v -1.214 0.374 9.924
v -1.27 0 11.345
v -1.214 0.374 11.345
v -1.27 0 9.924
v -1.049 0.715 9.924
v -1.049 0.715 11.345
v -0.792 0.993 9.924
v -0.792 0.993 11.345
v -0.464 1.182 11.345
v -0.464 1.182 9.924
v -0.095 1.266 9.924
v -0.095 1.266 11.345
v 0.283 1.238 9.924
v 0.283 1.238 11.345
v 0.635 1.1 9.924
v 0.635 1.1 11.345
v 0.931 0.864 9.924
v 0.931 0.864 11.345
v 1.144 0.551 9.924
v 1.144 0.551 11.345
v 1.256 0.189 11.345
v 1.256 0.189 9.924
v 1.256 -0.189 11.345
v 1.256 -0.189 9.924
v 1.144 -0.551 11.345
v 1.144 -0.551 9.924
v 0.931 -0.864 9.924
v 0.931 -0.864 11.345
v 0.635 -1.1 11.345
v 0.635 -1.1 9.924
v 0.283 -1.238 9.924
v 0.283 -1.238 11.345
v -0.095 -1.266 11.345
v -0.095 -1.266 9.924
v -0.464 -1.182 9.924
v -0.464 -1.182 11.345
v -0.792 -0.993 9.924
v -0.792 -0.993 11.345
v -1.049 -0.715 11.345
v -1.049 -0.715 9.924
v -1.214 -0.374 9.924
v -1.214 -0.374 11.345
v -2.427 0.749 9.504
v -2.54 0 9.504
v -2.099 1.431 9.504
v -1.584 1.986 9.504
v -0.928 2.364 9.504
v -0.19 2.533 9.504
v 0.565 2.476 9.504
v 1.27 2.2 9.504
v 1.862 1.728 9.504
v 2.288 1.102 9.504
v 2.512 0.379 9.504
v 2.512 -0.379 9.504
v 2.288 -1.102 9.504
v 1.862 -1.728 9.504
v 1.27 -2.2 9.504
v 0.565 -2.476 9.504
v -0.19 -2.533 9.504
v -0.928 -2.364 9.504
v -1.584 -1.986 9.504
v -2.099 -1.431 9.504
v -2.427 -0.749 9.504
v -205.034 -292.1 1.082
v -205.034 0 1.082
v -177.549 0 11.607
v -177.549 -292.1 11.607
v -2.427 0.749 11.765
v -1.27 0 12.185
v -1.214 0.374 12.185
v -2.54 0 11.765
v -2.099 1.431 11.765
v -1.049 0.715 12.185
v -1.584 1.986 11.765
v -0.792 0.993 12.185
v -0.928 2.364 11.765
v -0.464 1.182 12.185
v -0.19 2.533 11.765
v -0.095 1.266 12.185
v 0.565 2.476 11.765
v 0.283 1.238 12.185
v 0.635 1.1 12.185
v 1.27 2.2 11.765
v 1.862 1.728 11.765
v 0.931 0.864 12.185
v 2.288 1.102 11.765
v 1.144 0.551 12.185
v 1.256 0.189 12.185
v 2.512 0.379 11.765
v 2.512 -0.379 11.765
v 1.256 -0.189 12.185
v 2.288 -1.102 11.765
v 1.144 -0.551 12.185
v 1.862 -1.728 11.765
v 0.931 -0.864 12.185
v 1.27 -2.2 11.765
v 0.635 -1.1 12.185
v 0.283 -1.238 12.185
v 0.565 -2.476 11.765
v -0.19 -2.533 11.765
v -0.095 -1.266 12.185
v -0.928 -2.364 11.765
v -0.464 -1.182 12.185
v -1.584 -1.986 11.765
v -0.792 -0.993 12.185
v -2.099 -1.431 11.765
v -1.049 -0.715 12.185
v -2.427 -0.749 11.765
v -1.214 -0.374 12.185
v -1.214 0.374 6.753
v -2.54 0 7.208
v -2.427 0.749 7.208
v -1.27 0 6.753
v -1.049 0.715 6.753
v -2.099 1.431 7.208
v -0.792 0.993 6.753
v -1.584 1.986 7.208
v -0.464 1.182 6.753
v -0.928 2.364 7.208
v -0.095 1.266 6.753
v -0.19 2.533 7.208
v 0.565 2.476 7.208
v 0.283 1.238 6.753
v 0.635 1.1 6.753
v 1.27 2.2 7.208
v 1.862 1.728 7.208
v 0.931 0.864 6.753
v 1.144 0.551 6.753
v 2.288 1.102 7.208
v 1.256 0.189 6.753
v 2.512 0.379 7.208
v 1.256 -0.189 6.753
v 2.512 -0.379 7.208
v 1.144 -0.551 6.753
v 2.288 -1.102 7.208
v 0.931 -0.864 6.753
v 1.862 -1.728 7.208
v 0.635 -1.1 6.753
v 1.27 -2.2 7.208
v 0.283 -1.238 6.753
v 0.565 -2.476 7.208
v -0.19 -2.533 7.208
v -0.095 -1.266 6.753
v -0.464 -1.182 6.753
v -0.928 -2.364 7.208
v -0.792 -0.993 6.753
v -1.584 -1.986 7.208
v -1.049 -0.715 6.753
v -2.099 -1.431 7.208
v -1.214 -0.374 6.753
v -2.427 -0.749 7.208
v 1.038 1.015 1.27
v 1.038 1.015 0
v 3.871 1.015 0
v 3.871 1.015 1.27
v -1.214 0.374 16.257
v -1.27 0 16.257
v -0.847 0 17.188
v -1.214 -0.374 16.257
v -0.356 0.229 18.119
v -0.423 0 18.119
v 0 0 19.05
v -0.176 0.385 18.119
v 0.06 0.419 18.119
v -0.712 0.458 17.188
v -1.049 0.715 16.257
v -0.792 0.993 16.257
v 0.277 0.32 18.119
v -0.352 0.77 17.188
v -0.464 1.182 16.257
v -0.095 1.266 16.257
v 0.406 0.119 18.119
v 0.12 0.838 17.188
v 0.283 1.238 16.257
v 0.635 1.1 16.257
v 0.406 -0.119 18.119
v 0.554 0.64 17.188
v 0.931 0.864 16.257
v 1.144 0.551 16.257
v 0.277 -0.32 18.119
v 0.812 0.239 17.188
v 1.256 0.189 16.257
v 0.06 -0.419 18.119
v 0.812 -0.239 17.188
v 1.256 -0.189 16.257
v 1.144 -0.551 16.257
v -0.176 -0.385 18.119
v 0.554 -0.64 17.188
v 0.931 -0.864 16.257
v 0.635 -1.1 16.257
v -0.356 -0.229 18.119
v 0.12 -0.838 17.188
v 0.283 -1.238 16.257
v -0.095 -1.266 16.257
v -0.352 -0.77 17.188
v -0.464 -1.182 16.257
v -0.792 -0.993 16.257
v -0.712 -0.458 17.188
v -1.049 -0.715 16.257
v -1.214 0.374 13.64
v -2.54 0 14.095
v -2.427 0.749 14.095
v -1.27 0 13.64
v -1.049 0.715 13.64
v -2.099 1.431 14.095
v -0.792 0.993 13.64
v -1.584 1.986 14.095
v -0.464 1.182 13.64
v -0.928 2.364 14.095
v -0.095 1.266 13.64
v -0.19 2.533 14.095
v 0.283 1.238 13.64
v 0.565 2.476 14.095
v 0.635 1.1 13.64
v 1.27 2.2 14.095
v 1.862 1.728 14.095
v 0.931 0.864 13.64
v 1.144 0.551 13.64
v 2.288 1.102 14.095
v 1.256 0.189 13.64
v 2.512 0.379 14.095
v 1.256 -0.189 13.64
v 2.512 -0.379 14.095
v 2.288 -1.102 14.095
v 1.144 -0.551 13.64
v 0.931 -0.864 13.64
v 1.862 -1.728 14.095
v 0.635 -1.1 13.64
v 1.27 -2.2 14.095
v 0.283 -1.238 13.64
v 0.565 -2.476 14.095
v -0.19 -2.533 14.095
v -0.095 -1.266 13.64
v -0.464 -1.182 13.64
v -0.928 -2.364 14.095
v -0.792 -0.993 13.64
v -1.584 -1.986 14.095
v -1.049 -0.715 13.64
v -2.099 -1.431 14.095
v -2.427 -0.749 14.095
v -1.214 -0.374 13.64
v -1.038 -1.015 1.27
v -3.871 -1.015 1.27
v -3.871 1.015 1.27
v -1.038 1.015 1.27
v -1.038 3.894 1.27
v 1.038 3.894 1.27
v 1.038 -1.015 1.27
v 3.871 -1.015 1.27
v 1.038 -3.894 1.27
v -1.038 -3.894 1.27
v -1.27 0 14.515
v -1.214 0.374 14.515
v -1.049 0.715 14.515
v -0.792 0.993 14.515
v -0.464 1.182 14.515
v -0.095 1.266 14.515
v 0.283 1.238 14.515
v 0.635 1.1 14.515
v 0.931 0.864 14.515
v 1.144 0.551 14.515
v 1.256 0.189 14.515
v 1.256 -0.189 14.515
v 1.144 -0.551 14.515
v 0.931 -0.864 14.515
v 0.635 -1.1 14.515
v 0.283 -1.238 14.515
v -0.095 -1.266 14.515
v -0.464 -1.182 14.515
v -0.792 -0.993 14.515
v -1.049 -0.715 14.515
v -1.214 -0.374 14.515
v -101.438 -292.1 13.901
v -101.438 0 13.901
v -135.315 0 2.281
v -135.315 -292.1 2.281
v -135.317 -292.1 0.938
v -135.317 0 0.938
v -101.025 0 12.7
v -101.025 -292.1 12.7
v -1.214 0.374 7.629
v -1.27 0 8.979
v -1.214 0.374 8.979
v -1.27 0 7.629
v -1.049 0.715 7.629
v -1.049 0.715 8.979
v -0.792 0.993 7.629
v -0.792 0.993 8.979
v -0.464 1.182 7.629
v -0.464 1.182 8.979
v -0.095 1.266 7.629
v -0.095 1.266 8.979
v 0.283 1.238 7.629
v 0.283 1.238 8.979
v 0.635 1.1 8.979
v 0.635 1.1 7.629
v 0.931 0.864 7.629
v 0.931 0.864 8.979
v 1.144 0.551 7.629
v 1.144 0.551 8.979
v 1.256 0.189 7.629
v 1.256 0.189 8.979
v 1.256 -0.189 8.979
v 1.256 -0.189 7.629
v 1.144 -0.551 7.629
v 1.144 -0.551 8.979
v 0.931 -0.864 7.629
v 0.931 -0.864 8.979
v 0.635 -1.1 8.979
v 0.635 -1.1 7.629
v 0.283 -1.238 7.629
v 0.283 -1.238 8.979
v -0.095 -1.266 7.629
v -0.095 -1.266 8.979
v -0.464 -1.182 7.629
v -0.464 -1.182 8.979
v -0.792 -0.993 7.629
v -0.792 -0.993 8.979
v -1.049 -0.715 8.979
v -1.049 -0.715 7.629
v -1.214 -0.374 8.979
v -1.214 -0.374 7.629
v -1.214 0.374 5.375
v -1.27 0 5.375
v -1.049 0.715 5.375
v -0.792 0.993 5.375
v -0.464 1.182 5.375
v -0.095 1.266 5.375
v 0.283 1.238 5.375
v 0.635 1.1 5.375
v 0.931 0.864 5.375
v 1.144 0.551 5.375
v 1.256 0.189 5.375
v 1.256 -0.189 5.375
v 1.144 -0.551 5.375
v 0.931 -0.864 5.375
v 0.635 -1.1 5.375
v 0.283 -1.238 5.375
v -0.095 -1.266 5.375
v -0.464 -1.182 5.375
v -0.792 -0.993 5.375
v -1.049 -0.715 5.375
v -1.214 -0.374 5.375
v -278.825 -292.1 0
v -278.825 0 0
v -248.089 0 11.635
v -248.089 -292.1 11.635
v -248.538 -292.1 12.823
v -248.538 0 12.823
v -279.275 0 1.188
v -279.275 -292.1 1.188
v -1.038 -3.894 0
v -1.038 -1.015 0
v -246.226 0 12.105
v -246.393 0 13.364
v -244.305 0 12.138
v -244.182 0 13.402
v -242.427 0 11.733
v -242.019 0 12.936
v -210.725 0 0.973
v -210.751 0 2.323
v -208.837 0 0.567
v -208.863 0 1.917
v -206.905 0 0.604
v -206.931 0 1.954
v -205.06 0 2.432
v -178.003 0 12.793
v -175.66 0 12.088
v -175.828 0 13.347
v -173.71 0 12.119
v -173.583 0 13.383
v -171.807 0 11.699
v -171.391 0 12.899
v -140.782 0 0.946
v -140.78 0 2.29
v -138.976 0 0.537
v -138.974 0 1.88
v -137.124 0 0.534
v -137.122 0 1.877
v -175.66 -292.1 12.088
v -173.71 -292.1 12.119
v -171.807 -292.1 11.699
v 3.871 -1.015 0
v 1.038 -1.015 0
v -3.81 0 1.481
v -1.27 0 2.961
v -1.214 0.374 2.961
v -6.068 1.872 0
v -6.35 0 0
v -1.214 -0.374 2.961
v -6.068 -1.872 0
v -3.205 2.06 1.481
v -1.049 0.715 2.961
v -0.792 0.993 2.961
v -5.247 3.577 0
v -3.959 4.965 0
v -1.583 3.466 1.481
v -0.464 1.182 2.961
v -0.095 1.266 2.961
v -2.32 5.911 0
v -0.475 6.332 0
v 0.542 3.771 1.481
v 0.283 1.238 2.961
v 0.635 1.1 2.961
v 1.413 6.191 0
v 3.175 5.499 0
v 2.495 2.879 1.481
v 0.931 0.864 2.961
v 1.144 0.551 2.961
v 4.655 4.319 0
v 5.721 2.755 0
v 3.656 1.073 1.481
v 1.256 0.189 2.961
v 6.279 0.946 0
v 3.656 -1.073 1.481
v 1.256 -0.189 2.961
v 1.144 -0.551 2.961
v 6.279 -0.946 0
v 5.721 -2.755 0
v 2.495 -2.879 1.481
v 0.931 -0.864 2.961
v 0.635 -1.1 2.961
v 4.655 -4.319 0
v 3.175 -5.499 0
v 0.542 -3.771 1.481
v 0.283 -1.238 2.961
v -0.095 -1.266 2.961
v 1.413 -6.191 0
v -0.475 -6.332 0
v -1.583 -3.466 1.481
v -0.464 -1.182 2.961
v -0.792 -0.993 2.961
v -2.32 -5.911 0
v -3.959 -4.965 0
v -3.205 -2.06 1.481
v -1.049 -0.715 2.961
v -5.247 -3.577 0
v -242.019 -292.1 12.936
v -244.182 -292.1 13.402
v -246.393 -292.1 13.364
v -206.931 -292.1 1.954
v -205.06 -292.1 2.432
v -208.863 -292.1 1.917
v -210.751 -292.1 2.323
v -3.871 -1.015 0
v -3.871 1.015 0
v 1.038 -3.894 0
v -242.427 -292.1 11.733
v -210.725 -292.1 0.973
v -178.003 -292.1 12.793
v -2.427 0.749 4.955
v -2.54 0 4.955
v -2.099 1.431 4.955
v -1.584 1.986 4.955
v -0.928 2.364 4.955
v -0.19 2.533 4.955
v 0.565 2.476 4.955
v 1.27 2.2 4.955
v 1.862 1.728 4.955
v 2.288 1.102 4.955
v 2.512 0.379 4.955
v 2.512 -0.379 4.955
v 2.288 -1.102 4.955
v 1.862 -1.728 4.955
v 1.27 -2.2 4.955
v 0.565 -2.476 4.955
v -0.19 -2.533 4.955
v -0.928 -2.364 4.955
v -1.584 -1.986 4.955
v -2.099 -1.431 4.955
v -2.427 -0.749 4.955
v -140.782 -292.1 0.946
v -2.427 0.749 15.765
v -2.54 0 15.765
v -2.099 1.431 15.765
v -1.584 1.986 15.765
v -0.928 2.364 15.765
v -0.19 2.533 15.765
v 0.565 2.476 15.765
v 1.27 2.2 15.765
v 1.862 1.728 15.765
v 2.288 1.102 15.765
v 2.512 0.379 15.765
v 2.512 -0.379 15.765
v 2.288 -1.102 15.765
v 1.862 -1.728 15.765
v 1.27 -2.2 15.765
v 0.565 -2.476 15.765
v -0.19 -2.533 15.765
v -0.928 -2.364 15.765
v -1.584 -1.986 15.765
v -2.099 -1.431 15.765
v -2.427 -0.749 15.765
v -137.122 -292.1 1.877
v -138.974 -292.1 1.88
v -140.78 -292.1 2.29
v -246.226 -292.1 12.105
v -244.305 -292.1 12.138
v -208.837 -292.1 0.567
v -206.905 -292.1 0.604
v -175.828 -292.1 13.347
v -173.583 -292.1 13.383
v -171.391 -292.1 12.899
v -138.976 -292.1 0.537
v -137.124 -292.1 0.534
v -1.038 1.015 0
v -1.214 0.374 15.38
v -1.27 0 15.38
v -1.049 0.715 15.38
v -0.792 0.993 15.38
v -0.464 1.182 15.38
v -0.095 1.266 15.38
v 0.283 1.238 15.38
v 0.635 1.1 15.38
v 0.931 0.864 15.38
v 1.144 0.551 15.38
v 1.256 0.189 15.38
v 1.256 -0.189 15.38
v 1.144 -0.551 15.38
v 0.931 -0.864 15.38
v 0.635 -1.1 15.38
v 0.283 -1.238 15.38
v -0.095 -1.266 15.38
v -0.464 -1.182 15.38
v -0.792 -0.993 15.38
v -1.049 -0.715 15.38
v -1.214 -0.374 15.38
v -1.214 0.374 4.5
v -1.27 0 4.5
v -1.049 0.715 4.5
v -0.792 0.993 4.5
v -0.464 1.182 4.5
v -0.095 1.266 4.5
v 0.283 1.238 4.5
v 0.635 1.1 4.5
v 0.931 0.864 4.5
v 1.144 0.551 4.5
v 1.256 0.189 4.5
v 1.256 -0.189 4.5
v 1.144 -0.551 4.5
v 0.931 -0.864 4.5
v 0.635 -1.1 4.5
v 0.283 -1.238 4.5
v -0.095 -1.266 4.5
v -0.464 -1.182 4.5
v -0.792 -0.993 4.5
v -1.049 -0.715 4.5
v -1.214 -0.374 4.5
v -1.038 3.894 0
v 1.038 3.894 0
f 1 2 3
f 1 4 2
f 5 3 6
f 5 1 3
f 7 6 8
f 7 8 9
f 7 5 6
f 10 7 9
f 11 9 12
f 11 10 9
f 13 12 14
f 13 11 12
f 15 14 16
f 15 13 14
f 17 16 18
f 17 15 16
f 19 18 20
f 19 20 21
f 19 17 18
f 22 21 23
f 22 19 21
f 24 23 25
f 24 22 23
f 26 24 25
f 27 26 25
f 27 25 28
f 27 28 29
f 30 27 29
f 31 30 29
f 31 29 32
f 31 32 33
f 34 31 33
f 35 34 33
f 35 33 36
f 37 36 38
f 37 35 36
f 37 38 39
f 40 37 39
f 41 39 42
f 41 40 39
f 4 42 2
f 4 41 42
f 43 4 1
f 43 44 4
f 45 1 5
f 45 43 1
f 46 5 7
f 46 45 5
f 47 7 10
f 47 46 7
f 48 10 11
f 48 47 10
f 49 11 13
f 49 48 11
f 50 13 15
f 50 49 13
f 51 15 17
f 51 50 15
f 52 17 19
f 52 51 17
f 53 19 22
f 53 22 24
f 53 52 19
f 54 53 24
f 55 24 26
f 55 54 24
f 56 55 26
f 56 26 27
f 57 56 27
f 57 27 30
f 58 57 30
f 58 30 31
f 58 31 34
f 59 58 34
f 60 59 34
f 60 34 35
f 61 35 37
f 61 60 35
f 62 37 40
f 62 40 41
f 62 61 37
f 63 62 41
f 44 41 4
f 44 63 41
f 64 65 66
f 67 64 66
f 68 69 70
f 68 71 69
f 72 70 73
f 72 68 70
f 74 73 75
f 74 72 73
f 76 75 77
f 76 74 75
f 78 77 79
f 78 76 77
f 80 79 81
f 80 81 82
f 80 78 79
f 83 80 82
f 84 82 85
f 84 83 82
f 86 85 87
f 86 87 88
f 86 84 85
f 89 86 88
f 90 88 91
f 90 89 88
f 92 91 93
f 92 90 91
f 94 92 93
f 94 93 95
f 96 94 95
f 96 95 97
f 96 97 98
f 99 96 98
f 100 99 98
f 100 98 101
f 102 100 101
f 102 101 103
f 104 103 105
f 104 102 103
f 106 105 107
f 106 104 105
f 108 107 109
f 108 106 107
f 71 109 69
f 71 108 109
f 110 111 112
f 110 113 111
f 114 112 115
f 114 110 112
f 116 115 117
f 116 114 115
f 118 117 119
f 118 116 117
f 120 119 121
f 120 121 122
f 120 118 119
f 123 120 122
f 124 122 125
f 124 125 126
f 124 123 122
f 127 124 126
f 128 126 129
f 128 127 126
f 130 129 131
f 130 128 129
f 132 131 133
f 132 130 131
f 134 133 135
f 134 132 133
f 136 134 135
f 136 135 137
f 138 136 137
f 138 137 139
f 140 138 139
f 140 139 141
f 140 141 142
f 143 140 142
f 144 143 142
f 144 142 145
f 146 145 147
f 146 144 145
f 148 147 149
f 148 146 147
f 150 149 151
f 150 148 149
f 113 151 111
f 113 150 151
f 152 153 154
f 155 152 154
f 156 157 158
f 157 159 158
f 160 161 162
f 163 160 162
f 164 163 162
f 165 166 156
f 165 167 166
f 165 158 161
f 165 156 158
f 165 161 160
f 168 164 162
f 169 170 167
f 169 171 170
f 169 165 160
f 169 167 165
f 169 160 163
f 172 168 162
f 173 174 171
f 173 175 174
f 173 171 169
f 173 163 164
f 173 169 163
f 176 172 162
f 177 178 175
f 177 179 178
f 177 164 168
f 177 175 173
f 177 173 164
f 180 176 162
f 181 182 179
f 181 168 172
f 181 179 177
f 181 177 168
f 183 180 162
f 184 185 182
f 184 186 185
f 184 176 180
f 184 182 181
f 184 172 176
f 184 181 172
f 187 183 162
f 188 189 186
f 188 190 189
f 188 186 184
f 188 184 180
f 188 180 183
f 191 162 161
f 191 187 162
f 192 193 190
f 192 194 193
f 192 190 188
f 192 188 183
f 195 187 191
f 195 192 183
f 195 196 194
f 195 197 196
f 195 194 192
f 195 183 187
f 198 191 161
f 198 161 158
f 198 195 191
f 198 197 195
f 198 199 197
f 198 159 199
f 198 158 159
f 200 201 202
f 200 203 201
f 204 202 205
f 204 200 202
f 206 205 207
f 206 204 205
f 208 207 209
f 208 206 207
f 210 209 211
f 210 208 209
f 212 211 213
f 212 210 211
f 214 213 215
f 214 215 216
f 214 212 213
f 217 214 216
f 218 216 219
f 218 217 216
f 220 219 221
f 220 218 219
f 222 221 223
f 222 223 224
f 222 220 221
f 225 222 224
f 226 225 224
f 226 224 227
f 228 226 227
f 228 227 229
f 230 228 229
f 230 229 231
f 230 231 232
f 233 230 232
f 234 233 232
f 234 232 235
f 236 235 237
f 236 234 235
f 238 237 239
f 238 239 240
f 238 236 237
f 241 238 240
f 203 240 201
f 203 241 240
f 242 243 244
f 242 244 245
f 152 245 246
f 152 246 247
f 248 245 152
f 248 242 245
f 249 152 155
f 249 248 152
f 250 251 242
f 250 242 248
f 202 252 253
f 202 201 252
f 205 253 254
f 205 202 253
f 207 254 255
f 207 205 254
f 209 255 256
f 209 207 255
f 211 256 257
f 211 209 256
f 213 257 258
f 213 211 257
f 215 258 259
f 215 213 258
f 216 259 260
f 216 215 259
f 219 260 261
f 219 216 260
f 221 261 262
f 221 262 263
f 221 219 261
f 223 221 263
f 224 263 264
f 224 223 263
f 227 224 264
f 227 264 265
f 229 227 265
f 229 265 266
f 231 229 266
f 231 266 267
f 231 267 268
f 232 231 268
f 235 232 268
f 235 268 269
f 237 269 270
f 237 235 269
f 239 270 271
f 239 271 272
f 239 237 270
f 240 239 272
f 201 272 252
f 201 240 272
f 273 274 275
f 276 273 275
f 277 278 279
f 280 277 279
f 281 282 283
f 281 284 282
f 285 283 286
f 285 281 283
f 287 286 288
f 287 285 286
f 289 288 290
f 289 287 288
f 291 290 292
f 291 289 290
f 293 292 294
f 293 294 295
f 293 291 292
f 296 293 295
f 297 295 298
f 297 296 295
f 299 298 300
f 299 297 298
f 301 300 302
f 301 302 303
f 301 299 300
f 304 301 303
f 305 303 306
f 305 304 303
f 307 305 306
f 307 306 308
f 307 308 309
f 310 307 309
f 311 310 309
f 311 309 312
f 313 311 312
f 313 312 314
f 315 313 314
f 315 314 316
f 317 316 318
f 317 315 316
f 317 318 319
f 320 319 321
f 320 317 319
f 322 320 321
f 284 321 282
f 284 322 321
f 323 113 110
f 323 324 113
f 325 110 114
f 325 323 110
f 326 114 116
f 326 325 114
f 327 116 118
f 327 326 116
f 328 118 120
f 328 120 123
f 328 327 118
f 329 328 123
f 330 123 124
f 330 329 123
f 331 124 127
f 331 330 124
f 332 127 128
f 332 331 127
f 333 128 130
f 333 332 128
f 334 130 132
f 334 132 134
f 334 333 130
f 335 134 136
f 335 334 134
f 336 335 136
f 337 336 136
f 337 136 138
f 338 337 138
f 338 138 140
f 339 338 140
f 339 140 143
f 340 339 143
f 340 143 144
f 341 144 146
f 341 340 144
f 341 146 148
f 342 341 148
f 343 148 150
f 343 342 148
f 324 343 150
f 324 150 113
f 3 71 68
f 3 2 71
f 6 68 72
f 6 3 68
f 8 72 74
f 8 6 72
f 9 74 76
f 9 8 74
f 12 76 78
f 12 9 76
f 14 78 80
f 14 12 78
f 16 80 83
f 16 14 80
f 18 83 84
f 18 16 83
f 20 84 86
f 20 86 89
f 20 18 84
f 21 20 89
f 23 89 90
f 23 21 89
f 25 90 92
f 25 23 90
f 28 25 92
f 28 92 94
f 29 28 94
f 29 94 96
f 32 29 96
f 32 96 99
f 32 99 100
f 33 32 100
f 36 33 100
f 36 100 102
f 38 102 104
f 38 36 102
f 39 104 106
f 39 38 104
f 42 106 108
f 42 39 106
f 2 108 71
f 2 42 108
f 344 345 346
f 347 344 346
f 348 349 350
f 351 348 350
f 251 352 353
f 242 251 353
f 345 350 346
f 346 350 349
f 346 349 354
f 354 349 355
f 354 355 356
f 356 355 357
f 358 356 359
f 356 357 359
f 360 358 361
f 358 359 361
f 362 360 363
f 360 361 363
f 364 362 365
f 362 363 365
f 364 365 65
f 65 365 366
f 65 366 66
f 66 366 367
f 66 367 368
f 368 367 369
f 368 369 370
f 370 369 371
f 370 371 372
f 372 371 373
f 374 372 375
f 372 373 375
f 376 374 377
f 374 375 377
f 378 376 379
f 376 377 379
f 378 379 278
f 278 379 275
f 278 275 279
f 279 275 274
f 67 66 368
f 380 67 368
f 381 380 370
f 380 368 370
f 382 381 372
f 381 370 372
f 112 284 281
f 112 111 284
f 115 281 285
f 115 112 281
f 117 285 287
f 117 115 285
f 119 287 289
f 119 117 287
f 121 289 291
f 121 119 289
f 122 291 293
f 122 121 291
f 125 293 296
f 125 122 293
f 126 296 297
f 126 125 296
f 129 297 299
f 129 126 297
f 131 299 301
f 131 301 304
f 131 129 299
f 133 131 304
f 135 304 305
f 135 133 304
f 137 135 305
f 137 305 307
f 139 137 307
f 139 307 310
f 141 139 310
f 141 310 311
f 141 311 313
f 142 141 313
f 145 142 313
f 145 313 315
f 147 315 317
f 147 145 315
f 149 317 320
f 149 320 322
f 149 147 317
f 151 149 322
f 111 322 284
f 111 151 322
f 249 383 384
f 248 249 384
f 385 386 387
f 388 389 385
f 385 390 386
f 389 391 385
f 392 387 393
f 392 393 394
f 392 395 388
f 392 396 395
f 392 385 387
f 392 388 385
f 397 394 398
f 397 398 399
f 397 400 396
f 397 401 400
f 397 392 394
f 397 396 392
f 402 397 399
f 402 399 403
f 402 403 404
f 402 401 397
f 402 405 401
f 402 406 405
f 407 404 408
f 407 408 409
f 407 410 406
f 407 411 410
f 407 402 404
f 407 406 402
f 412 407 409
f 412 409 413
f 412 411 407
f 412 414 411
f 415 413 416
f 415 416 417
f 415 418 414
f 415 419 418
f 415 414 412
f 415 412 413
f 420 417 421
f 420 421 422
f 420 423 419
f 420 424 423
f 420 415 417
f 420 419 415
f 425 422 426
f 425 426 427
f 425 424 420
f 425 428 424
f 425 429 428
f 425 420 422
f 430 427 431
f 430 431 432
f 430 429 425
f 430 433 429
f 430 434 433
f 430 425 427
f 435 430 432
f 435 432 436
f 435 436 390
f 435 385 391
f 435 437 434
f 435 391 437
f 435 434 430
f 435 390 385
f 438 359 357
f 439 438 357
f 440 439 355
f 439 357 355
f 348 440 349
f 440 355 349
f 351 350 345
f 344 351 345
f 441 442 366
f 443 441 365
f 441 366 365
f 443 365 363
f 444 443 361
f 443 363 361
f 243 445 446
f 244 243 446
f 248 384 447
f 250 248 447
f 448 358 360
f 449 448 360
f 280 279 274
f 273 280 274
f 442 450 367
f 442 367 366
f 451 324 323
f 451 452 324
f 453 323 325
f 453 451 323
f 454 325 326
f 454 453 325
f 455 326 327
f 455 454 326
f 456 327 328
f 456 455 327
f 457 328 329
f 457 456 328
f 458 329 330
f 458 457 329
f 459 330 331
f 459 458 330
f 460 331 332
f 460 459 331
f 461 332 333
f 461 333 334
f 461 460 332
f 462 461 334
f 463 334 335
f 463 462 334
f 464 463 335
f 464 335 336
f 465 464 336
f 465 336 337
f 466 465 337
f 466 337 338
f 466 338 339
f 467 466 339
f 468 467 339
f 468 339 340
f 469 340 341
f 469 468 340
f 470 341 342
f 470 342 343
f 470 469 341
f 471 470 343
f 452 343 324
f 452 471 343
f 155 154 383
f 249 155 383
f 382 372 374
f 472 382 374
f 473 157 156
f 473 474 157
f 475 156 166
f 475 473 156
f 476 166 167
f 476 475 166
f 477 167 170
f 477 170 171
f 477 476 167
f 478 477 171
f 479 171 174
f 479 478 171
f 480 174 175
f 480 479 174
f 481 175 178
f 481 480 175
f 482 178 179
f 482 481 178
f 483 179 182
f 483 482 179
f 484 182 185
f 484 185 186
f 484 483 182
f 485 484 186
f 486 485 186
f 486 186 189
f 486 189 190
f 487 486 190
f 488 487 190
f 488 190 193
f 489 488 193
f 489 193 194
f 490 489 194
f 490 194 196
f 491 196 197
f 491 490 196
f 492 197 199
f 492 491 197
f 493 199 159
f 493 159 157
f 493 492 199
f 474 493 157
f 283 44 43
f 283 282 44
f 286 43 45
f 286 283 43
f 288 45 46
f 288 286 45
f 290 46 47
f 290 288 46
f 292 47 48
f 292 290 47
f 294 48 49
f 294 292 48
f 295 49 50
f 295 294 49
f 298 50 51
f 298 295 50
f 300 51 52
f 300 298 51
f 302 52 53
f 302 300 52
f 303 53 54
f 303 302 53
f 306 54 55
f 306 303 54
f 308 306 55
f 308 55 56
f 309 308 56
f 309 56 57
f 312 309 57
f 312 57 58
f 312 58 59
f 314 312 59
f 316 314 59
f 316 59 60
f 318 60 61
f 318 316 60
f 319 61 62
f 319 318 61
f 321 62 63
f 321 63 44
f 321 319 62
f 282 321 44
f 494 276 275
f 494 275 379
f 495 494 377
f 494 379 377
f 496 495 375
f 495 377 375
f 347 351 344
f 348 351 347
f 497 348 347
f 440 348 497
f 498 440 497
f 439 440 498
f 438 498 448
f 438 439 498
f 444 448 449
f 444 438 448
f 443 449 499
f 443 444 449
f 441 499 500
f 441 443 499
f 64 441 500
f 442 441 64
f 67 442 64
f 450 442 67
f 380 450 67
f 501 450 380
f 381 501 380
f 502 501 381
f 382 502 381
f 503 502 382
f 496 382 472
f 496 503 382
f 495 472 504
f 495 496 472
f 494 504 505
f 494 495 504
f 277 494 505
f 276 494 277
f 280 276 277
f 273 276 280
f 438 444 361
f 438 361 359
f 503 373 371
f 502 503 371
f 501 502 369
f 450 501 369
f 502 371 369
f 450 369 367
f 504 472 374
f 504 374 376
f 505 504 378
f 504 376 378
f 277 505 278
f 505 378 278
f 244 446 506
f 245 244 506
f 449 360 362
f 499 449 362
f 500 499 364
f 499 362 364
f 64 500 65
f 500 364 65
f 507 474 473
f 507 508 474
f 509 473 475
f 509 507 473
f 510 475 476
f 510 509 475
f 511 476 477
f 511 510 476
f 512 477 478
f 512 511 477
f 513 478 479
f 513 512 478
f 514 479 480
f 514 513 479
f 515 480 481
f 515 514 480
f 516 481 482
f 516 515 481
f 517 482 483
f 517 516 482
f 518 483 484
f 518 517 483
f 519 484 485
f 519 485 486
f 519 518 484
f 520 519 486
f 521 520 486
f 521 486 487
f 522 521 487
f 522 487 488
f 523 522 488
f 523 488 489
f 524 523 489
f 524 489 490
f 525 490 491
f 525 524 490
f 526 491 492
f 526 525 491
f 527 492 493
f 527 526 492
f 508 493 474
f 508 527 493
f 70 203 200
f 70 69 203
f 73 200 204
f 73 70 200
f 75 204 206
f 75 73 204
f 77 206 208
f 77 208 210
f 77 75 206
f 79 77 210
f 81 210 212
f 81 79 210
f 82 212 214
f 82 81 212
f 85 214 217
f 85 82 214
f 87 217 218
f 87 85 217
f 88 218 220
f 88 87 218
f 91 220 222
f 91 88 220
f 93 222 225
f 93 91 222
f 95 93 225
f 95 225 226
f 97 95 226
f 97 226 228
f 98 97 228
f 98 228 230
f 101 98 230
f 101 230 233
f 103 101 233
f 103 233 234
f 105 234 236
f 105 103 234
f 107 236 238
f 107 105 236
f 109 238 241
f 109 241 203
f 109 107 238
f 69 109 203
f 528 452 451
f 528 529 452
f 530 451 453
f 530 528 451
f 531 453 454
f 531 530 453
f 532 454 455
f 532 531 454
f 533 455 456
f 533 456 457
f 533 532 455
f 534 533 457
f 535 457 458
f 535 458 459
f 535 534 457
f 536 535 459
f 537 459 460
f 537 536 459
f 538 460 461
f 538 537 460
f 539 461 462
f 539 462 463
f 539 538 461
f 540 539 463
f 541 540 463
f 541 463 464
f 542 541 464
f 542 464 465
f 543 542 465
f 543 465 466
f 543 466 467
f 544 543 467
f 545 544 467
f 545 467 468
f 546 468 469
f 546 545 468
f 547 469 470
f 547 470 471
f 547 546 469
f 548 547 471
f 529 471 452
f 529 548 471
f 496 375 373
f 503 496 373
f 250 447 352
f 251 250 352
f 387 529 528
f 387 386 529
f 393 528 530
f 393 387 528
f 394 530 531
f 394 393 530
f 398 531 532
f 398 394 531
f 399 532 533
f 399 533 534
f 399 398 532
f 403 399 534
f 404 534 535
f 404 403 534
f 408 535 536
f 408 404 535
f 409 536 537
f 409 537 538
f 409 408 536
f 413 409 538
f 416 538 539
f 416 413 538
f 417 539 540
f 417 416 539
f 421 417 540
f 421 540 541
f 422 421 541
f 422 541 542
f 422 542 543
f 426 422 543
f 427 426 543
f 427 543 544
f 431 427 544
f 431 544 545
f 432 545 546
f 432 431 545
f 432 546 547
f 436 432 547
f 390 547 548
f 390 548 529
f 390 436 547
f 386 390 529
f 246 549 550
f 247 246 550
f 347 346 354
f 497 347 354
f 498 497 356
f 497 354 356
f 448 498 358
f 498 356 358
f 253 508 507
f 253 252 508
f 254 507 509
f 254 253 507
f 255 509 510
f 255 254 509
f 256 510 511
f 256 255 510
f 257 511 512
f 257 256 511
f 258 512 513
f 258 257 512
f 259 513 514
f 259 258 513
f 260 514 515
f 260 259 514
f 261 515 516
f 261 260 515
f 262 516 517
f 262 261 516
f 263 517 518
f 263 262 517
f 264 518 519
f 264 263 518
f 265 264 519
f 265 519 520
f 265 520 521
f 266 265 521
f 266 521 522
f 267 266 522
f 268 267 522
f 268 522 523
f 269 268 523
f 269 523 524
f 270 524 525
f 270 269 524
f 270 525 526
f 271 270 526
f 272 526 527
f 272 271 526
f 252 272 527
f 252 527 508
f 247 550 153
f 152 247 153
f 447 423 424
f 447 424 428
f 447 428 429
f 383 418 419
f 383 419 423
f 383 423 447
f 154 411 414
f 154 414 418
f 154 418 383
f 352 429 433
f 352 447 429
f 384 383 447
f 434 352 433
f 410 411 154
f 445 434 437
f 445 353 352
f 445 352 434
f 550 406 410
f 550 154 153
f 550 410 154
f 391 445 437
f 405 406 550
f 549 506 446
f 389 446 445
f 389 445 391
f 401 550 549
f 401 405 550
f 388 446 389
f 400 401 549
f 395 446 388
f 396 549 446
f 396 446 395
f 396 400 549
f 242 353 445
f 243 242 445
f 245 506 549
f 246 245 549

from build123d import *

# Parameters (mm, degrees)
F1_DEPTH = 292.1
F5_DEPTH = 1.27


with BuildPart() as f1:
    # F0 (on Front) → F1 (new body)
    with BuildSketch(Plane.XZ):
        with BuildLine():
            Line((-279.27507, 1.187749), (-278.825457, 0))
            Line((-278.825457, 0), (-248.088821, 11.635094))
            ThreePointArc((-248.088821, 11.635094), (-245.266575, 12.176691), (-242.427261, 11.733181))
            Line((-242.427261, 11.733181), (-210.725298, 0.972653))
            ThreePointArc((-210.725298, 0.972653), (-207.869918, 0.529437), (-205.033702, 1.082175))
            Line((-205.033702, 1.082175), (-177.548922, 11.606967))
            ThreePointArc((-177.548922, 11.606967), (-174.685882, 12.160179), (-171.806571, 11.69908))
            Line((-171.806571, 11.69908), (-140.781749, 0.946414))
            ThreePointArc((-140.781749, 0.946414), (-138.050272, 0.484248), (-135.317333, 0.93768))
            Line((-135.317333, 0.93768), (-101.025457, 12.7))
            Line((-101.025457, 12.7), (-101.437509, 13.901296))
            Line((-101.437509, 13.901296), (-135.315186, 2.281049))
            ThreePointArc((-135.315186, 2.281049), (-138.048125, 1.827617), (-140.779602, 2.289783))
            Line((-140.779602, 2.289783), (-171.390681, 12.899053))
            ThreePointArc((-171.390681, 12.899053), (-174.706251, 13.430015), (-178.003085, 12.792984))
            Line((-178.003085, 12.792984), (-205.05968, 2.432158))
            ThreePointArc((-205.05968, 2.432158), (-207.895895, 1.87942), (-210.751275, 2.322636))
            Line((-210.751275, 2.322636), (-242.019062, 12.935792))
            ThreePointArc((-242.019062, 12.935792), (-245.288574, 13.4465), (-248.538433, 12.822844))
            Line((-248.538433, 12.822844), (-279.27507, 1.187749))
        make_face()
    extrude(amount=F1_DEPTH)


with BuildPart() as f3:
    # F2 (on Front) → F3 (revolve)
    with BuildSketch(Plane.XZ):
        Polygon((-6.35, 0), (0, 0), (0, 19.05), (-1.27, 16.256916), (-2.54, 15.764615), (-1.27, 15.379577), (-1.27, 14.515168), (-2.54, 14.095127), (-1.27, 13.640082), (-1.27, 12.18462), (-2.54, 11.764579), (-1.27, 11.344538), (-1.27, 9.924078), (-2.54, 9.504037), (-1.27, 8.978986), (-1.27, 7.628533), (-2.54, 7.208492), (-1.27, 6.753448), (-1.27, 5.374726), (-2.54, 4.954685), (-1.27, 4.49964), (-1.27, 2.961306), align=None)
    revolve(axis=Axis((0, 0, 9.525), (0, 0, -1)))

    # F4 (on face) → F5 (cut)
    with BuildSketch(Plane(origin=(0, 0, 0), x_dir=(1, 0, 0), z_dir=(0, 0, -1))):
        Polygon((1.037806, 3.893726), (-1.037806, 3.893726), (-1.037806, 1.014865), (-3.870785, 1.014865), (-3.870785, -1.014865), (-1.037806, -1.014865), (-1.037806, -3.893726), (1.037806, -3.893726), (1.037806, -1.014865), (3.870785, -1.014865), (3.870785, 1.014865), (1.037806, 1.014865), align=None)
    extrude(amount=-F5_DEPTH, mode=Mode.SUBTRACT)


solid = Compound([f1.part, f3.part])
